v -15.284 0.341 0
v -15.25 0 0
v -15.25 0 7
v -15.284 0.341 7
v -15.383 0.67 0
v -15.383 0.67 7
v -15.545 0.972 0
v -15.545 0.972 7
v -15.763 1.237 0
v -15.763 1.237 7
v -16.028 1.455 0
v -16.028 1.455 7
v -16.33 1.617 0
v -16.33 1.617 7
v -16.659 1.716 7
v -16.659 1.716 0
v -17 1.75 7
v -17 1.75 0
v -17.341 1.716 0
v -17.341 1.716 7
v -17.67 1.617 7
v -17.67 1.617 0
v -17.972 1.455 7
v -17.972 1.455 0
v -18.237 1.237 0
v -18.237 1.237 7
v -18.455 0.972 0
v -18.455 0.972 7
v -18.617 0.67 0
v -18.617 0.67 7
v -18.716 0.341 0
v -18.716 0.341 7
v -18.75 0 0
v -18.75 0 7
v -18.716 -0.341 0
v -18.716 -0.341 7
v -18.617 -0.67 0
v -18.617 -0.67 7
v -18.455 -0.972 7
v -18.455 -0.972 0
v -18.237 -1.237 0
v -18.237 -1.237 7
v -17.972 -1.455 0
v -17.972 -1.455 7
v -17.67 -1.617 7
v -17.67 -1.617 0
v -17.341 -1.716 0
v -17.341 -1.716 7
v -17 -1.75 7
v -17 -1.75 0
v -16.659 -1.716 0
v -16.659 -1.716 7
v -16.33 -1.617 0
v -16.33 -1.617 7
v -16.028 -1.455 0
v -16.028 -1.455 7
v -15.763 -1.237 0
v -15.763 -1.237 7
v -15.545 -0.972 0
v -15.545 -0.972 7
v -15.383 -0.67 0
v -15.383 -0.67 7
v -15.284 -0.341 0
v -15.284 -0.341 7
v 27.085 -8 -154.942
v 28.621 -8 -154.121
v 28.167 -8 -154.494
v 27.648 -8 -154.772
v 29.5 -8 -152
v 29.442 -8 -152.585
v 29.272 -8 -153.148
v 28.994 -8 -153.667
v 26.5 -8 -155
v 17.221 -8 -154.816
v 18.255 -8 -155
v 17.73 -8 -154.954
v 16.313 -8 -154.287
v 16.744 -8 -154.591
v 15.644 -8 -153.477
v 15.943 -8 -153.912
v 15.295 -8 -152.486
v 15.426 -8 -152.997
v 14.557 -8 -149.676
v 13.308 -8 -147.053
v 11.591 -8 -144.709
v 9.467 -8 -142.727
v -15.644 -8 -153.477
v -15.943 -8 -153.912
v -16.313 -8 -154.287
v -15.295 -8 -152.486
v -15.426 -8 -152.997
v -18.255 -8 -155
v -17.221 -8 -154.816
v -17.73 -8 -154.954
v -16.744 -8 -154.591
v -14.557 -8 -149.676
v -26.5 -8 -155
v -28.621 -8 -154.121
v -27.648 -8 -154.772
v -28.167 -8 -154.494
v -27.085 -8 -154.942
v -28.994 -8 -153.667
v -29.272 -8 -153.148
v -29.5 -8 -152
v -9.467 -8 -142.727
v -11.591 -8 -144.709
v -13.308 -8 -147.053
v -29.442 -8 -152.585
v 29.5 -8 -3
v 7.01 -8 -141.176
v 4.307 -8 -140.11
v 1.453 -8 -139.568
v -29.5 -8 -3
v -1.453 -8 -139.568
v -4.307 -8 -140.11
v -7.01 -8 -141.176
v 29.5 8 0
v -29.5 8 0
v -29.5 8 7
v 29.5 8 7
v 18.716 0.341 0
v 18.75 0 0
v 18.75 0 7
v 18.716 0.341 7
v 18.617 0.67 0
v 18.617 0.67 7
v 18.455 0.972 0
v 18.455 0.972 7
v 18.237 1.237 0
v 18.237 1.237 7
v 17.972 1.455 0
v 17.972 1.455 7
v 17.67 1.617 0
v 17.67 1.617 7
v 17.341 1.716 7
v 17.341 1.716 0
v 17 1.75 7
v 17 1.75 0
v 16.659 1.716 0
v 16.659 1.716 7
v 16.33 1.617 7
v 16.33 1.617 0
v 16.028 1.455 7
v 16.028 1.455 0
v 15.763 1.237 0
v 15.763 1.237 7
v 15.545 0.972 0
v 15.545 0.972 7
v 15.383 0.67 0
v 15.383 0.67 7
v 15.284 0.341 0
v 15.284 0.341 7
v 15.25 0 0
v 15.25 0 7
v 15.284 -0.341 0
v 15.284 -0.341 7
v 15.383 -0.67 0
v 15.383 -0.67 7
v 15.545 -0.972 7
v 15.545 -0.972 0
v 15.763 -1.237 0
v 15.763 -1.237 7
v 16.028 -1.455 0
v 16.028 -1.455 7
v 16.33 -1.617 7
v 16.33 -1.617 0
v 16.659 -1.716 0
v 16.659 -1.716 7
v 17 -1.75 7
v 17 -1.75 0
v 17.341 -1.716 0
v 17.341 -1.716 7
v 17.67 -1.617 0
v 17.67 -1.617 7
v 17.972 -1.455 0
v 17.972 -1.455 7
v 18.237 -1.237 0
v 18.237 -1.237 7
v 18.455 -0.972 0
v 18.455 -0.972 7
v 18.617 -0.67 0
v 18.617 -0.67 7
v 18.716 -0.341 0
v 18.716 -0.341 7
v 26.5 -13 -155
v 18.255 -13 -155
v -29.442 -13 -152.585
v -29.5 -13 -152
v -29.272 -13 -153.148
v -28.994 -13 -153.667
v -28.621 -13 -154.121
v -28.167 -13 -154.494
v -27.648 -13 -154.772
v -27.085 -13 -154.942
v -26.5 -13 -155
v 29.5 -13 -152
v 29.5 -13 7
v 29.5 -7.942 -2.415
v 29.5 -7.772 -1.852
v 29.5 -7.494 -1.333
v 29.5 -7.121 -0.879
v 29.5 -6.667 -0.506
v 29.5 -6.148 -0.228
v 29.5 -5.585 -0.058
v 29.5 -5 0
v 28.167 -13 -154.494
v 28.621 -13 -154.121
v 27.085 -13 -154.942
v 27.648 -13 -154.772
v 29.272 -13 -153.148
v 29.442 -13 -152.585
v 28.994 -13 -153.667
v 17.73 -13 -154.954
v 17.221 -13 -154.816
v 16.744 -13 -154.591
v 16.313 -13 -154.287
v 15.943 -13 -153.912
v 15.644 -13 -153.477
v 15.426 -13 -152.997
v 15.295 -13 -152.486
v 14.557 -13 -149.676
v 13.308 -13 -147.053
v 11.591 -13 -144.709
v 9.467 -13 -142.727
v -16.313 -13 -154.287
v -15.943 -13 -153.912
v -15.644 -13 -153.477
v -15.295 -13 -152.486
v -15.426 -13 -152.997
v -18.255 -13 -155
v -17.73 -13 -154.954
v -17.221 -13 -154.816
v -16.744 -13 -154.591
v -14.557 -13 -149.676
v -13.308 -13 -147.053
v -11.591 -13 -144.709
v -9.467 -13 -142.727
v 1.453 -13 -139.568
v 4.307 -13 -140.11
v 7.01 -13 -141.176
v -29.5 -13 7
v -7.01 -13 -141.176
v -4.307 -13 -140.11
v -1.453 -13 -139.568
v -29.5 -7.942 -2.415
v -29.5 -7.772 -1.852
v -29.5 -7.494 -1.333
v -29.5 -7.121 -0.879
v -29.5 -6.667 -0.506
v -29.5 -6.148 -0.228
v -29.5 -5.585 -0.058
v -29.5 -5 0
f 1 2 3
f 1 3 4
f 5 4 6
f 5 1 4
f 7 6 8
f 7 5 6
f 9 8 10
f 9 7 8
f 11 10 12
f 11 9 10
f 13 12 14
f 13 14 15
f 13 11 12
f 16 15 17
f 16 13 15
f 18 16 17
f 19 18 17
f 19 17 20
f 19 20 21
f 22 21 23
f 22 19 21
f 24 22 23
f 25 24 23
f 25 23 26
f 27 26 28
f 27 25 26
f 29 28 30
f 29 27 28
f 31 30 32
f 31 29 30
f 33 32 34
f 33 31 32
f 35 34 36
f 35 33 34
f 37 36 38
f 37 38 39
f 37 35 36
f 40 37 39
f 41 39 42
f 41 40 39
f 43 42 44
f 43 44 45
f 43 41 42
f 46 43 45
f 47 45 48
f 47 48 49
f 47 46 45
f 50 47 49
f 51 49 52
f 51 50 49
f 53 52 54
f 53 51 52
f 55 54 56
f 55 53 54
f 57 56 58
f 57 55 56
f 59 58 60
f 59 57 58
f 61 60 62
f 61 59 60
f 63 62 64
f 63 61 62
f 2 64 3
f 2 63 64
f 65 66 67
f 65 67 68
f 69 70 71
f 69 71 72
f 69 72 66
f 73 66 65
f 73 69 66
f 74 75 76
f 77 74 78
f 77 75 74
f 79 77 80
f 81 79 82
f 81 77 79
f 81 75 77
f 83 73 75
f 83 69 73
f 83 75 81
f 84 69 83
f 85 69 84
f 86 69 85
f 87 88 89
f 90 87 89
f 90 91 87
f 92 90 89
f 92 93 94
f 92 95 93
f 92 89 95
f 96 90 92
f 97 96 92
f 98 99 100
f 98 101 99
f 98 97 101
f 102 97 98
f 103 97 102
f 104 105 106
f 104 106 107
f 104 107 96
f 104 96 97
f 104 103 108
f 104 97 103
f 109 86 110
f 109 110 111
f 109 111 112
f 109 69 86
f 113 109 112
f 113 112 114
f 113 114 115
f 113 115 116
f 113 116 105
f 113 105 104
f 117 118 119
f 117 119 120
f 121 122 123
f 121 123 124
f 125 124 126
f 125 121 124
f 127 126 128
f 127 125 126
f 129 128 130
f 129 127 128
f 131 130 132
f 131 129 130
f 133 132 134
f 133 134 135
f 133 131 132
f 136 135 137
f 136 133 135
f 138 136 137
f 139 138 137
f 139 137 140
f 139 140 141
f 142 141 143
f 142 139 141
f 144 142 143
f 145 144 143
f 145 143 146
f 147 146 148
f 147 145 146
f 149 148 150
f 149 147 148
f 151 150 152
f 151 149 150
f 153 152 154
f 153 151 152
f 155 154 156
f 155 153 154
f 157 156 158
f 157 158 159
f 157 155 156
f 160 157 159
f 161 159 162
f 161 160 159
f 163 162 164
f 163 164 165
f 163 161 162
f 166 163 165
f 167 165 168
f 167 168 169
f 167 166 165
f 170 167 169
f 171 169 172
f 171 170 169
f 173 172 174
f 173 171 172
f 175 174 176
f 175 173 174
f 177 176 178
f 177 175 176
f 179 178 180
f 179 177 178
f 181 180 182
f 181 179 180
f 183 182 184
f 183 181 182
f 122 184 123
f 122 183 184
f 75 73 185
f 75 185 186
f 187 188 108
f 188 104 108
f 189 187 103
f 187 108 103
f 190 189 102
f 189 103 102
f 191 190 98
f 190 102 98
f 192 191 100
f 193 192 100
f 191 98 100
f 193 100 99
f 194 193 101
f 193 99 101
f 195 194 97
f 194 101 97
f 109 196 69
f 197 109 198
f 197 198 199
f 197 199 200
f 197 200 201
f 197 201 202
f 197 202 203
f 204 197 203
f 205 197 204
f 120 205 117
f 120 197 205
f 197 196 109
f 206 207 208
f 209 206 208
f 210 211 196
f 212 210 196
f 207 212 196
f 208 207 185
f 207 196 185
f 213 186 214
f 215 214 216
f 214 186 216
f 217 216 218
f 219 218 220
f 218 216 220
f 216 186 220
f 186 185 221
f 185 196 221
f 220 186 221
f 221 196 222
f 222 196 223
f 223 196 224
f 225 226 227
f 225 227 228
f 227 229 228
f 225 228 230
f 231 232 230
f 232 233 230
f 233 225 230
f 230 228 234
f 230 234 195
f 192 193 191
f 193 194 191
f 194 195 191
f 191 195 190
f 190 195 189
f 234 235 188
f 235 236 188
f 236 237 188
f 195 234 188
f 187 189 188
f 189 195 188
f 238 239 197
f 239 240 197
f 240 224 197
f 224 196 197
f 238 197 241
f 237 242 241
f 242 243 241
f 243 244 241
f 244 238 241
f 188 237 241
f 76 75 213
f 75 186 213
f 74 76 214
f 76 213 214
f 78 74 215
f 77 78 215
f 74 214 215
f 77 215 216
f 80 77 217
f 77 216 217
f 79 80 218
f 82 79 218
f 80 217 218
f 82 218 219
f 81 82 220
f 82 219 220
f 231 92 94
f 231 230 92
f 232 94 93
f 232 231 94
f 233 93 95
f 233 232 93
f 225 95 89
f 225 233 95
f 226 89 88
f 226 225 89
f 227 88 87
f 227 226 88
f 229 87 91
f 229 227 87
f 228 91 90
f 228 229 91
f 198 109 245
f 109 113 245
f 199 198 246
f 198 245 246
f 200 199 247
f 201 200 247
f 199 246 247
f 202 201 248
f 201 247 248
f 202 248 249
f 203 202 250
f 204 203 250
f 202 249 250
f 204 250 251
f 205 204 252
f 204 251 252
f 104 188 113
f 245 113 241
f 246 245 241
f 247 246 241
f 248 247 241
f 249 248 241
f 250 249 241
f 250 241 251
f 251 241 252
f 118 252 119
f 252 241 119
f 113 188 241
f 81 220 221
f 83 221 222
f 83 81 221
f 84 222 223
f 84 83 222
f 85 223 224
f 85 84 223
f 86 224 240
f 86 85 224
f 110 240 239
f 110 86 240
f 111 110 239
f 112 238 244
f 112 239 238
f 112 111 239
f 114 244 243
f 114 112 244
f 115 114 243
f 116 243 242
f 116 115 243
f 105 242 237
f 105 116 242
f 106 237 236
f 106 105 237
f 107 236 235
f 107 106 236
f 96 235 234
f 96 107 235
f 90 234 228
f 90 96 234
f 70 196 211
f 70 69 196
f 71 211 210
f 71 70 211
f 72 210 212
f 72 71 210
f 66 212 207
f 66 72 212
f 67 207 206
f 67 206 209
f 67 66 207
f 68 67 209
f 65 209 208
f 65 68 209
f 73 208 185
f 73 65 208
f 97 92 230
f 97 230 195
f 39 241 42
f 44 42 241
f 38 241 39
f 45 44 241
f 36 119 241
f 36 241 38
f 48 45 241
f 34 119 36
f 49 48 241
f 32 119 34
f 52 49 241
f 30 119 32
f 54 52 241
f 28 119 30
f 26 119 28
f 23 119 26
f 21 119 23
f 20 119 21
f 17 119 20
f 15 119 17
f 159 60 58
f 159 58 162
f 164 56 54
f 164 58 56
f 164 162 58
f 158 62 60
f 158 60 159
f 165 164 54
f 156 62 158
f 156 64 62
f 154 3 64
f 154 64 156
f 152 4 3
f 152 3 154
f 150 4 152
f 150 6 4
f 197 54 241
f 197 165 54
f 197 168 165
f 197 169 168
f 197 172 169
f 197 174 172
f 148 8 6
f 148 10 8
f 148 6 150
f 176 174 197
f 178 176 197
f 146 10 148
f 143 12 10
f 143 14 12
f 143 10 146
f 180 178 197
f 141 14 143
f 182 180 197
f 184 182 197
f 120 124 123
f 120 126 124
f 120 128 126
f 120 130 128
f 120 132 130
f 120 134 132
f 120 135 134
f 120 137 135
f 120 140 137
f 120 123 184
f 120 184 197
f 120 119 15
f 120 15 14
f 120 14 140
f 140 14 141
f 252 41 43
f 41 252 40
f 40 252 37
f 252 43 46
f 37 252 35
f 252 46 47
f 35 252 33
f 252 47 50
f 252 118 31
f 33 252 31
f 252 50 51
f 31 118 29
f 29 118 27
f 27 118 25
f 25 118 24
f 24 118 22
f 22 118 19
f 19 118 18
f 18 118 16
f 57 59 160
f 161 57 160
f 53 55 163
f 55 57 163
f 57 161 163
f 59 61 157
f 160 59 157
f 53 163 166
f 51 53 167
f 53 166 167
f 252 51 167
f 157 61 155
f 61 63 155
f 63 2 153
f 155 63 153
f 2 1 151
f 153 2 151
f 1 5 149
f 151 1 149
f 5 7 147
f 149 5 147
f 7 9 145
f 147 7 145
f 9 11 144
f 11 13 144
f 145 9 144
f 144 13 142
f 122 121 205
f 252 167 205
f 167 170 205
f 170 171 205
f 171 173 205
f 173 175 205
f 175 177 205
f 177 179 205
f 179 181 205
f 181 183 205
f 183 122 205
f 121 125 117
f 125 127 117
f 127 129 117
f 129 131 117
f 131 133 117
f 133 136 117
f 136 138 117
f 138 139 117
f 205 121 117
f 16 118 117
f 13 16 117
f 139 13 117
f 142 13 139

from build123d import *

# Parameters (mm, degrees)
SKETCH1_W           = 59
SKETCH1_H           = 21
SKETCH1_R           = 1.75
BOSS_EXTRUDE1_DEPTH = 7
SKETCH2_W           = 59
SKETCH2_H           = 5
BOSS_EXTRUDE2_DEPTH = 155
CUT_EXTRUDE1_DEPTH  = 159.591456264
FILLET1_R           = 3
FILLET2_R           = 3


with BuildPart() as part:
    # Sketch1 → Boss-Extrude1 (new body)
    with BuildSketch(Plane.XY):
        with Locations((0, -2.5)):
            Rectangle(SKETCH1_W, SKETCH1_H)
        with Locations((-17, 0)):
            Circle(SKETCH1_R, mode=Mode.SUBTRACT)
        with Locations((17, 0)):
            Circle(SKETCH1_R, mode=Mode.SUBTRACT)
    extrude(amount=BOSS_EXTRUDE1_DEPTH)

    # Sketch2 → Boss-Extrude2 (add)
    with BuildSketch(Plane(origin=(0, 0, 0), x_dir=(-1, 0, 0), z_dir=(0, 0, -1))):
        with Locations((0, -10.5)):
            Rectangle(SKETCH2_W, SKETCH2_H)
    extrude(amount=BOSS_EXTRUDE2_DEPTH)

    # Sketch4 → Cut-Extrude1 (cut, through all)
    with BuildSketch(Plane(origin=(0, -8, 0), x_dir=(1, 0, 0), z_dir=(0, 1, 0))):
        with BuildLine():
            Line((-15.5, 155), (15.5, 155))
            ThreePointArc((15.5, 155), (0, 139.5), (-15.5, 155))
        make_face()
    extrude(amount=-CUT_EXTRUDE1_DEPTH, mode=Mode.SUBTRACT)

    # Fillet1
    fillet1_edges = [part.edges().sort_by_distance(p)[0] for p in [
        (0, -8, 0),
    ]]
    fillet(fillet1_edges, radius=FILLET1_R)

    # Fillet2
    fillet2_edges = [part.edges().sort_by_distance(p)[0] for p in [
        (29.5, -10.5, -155),
        (-29.5, -10.5, -155),
        (15.5, -10.5, -155),
        (-15.5, -10.5, -155),
    ]]
    fillet(fillet2_edges, radius=FILLET2_R)


solid = part.part
